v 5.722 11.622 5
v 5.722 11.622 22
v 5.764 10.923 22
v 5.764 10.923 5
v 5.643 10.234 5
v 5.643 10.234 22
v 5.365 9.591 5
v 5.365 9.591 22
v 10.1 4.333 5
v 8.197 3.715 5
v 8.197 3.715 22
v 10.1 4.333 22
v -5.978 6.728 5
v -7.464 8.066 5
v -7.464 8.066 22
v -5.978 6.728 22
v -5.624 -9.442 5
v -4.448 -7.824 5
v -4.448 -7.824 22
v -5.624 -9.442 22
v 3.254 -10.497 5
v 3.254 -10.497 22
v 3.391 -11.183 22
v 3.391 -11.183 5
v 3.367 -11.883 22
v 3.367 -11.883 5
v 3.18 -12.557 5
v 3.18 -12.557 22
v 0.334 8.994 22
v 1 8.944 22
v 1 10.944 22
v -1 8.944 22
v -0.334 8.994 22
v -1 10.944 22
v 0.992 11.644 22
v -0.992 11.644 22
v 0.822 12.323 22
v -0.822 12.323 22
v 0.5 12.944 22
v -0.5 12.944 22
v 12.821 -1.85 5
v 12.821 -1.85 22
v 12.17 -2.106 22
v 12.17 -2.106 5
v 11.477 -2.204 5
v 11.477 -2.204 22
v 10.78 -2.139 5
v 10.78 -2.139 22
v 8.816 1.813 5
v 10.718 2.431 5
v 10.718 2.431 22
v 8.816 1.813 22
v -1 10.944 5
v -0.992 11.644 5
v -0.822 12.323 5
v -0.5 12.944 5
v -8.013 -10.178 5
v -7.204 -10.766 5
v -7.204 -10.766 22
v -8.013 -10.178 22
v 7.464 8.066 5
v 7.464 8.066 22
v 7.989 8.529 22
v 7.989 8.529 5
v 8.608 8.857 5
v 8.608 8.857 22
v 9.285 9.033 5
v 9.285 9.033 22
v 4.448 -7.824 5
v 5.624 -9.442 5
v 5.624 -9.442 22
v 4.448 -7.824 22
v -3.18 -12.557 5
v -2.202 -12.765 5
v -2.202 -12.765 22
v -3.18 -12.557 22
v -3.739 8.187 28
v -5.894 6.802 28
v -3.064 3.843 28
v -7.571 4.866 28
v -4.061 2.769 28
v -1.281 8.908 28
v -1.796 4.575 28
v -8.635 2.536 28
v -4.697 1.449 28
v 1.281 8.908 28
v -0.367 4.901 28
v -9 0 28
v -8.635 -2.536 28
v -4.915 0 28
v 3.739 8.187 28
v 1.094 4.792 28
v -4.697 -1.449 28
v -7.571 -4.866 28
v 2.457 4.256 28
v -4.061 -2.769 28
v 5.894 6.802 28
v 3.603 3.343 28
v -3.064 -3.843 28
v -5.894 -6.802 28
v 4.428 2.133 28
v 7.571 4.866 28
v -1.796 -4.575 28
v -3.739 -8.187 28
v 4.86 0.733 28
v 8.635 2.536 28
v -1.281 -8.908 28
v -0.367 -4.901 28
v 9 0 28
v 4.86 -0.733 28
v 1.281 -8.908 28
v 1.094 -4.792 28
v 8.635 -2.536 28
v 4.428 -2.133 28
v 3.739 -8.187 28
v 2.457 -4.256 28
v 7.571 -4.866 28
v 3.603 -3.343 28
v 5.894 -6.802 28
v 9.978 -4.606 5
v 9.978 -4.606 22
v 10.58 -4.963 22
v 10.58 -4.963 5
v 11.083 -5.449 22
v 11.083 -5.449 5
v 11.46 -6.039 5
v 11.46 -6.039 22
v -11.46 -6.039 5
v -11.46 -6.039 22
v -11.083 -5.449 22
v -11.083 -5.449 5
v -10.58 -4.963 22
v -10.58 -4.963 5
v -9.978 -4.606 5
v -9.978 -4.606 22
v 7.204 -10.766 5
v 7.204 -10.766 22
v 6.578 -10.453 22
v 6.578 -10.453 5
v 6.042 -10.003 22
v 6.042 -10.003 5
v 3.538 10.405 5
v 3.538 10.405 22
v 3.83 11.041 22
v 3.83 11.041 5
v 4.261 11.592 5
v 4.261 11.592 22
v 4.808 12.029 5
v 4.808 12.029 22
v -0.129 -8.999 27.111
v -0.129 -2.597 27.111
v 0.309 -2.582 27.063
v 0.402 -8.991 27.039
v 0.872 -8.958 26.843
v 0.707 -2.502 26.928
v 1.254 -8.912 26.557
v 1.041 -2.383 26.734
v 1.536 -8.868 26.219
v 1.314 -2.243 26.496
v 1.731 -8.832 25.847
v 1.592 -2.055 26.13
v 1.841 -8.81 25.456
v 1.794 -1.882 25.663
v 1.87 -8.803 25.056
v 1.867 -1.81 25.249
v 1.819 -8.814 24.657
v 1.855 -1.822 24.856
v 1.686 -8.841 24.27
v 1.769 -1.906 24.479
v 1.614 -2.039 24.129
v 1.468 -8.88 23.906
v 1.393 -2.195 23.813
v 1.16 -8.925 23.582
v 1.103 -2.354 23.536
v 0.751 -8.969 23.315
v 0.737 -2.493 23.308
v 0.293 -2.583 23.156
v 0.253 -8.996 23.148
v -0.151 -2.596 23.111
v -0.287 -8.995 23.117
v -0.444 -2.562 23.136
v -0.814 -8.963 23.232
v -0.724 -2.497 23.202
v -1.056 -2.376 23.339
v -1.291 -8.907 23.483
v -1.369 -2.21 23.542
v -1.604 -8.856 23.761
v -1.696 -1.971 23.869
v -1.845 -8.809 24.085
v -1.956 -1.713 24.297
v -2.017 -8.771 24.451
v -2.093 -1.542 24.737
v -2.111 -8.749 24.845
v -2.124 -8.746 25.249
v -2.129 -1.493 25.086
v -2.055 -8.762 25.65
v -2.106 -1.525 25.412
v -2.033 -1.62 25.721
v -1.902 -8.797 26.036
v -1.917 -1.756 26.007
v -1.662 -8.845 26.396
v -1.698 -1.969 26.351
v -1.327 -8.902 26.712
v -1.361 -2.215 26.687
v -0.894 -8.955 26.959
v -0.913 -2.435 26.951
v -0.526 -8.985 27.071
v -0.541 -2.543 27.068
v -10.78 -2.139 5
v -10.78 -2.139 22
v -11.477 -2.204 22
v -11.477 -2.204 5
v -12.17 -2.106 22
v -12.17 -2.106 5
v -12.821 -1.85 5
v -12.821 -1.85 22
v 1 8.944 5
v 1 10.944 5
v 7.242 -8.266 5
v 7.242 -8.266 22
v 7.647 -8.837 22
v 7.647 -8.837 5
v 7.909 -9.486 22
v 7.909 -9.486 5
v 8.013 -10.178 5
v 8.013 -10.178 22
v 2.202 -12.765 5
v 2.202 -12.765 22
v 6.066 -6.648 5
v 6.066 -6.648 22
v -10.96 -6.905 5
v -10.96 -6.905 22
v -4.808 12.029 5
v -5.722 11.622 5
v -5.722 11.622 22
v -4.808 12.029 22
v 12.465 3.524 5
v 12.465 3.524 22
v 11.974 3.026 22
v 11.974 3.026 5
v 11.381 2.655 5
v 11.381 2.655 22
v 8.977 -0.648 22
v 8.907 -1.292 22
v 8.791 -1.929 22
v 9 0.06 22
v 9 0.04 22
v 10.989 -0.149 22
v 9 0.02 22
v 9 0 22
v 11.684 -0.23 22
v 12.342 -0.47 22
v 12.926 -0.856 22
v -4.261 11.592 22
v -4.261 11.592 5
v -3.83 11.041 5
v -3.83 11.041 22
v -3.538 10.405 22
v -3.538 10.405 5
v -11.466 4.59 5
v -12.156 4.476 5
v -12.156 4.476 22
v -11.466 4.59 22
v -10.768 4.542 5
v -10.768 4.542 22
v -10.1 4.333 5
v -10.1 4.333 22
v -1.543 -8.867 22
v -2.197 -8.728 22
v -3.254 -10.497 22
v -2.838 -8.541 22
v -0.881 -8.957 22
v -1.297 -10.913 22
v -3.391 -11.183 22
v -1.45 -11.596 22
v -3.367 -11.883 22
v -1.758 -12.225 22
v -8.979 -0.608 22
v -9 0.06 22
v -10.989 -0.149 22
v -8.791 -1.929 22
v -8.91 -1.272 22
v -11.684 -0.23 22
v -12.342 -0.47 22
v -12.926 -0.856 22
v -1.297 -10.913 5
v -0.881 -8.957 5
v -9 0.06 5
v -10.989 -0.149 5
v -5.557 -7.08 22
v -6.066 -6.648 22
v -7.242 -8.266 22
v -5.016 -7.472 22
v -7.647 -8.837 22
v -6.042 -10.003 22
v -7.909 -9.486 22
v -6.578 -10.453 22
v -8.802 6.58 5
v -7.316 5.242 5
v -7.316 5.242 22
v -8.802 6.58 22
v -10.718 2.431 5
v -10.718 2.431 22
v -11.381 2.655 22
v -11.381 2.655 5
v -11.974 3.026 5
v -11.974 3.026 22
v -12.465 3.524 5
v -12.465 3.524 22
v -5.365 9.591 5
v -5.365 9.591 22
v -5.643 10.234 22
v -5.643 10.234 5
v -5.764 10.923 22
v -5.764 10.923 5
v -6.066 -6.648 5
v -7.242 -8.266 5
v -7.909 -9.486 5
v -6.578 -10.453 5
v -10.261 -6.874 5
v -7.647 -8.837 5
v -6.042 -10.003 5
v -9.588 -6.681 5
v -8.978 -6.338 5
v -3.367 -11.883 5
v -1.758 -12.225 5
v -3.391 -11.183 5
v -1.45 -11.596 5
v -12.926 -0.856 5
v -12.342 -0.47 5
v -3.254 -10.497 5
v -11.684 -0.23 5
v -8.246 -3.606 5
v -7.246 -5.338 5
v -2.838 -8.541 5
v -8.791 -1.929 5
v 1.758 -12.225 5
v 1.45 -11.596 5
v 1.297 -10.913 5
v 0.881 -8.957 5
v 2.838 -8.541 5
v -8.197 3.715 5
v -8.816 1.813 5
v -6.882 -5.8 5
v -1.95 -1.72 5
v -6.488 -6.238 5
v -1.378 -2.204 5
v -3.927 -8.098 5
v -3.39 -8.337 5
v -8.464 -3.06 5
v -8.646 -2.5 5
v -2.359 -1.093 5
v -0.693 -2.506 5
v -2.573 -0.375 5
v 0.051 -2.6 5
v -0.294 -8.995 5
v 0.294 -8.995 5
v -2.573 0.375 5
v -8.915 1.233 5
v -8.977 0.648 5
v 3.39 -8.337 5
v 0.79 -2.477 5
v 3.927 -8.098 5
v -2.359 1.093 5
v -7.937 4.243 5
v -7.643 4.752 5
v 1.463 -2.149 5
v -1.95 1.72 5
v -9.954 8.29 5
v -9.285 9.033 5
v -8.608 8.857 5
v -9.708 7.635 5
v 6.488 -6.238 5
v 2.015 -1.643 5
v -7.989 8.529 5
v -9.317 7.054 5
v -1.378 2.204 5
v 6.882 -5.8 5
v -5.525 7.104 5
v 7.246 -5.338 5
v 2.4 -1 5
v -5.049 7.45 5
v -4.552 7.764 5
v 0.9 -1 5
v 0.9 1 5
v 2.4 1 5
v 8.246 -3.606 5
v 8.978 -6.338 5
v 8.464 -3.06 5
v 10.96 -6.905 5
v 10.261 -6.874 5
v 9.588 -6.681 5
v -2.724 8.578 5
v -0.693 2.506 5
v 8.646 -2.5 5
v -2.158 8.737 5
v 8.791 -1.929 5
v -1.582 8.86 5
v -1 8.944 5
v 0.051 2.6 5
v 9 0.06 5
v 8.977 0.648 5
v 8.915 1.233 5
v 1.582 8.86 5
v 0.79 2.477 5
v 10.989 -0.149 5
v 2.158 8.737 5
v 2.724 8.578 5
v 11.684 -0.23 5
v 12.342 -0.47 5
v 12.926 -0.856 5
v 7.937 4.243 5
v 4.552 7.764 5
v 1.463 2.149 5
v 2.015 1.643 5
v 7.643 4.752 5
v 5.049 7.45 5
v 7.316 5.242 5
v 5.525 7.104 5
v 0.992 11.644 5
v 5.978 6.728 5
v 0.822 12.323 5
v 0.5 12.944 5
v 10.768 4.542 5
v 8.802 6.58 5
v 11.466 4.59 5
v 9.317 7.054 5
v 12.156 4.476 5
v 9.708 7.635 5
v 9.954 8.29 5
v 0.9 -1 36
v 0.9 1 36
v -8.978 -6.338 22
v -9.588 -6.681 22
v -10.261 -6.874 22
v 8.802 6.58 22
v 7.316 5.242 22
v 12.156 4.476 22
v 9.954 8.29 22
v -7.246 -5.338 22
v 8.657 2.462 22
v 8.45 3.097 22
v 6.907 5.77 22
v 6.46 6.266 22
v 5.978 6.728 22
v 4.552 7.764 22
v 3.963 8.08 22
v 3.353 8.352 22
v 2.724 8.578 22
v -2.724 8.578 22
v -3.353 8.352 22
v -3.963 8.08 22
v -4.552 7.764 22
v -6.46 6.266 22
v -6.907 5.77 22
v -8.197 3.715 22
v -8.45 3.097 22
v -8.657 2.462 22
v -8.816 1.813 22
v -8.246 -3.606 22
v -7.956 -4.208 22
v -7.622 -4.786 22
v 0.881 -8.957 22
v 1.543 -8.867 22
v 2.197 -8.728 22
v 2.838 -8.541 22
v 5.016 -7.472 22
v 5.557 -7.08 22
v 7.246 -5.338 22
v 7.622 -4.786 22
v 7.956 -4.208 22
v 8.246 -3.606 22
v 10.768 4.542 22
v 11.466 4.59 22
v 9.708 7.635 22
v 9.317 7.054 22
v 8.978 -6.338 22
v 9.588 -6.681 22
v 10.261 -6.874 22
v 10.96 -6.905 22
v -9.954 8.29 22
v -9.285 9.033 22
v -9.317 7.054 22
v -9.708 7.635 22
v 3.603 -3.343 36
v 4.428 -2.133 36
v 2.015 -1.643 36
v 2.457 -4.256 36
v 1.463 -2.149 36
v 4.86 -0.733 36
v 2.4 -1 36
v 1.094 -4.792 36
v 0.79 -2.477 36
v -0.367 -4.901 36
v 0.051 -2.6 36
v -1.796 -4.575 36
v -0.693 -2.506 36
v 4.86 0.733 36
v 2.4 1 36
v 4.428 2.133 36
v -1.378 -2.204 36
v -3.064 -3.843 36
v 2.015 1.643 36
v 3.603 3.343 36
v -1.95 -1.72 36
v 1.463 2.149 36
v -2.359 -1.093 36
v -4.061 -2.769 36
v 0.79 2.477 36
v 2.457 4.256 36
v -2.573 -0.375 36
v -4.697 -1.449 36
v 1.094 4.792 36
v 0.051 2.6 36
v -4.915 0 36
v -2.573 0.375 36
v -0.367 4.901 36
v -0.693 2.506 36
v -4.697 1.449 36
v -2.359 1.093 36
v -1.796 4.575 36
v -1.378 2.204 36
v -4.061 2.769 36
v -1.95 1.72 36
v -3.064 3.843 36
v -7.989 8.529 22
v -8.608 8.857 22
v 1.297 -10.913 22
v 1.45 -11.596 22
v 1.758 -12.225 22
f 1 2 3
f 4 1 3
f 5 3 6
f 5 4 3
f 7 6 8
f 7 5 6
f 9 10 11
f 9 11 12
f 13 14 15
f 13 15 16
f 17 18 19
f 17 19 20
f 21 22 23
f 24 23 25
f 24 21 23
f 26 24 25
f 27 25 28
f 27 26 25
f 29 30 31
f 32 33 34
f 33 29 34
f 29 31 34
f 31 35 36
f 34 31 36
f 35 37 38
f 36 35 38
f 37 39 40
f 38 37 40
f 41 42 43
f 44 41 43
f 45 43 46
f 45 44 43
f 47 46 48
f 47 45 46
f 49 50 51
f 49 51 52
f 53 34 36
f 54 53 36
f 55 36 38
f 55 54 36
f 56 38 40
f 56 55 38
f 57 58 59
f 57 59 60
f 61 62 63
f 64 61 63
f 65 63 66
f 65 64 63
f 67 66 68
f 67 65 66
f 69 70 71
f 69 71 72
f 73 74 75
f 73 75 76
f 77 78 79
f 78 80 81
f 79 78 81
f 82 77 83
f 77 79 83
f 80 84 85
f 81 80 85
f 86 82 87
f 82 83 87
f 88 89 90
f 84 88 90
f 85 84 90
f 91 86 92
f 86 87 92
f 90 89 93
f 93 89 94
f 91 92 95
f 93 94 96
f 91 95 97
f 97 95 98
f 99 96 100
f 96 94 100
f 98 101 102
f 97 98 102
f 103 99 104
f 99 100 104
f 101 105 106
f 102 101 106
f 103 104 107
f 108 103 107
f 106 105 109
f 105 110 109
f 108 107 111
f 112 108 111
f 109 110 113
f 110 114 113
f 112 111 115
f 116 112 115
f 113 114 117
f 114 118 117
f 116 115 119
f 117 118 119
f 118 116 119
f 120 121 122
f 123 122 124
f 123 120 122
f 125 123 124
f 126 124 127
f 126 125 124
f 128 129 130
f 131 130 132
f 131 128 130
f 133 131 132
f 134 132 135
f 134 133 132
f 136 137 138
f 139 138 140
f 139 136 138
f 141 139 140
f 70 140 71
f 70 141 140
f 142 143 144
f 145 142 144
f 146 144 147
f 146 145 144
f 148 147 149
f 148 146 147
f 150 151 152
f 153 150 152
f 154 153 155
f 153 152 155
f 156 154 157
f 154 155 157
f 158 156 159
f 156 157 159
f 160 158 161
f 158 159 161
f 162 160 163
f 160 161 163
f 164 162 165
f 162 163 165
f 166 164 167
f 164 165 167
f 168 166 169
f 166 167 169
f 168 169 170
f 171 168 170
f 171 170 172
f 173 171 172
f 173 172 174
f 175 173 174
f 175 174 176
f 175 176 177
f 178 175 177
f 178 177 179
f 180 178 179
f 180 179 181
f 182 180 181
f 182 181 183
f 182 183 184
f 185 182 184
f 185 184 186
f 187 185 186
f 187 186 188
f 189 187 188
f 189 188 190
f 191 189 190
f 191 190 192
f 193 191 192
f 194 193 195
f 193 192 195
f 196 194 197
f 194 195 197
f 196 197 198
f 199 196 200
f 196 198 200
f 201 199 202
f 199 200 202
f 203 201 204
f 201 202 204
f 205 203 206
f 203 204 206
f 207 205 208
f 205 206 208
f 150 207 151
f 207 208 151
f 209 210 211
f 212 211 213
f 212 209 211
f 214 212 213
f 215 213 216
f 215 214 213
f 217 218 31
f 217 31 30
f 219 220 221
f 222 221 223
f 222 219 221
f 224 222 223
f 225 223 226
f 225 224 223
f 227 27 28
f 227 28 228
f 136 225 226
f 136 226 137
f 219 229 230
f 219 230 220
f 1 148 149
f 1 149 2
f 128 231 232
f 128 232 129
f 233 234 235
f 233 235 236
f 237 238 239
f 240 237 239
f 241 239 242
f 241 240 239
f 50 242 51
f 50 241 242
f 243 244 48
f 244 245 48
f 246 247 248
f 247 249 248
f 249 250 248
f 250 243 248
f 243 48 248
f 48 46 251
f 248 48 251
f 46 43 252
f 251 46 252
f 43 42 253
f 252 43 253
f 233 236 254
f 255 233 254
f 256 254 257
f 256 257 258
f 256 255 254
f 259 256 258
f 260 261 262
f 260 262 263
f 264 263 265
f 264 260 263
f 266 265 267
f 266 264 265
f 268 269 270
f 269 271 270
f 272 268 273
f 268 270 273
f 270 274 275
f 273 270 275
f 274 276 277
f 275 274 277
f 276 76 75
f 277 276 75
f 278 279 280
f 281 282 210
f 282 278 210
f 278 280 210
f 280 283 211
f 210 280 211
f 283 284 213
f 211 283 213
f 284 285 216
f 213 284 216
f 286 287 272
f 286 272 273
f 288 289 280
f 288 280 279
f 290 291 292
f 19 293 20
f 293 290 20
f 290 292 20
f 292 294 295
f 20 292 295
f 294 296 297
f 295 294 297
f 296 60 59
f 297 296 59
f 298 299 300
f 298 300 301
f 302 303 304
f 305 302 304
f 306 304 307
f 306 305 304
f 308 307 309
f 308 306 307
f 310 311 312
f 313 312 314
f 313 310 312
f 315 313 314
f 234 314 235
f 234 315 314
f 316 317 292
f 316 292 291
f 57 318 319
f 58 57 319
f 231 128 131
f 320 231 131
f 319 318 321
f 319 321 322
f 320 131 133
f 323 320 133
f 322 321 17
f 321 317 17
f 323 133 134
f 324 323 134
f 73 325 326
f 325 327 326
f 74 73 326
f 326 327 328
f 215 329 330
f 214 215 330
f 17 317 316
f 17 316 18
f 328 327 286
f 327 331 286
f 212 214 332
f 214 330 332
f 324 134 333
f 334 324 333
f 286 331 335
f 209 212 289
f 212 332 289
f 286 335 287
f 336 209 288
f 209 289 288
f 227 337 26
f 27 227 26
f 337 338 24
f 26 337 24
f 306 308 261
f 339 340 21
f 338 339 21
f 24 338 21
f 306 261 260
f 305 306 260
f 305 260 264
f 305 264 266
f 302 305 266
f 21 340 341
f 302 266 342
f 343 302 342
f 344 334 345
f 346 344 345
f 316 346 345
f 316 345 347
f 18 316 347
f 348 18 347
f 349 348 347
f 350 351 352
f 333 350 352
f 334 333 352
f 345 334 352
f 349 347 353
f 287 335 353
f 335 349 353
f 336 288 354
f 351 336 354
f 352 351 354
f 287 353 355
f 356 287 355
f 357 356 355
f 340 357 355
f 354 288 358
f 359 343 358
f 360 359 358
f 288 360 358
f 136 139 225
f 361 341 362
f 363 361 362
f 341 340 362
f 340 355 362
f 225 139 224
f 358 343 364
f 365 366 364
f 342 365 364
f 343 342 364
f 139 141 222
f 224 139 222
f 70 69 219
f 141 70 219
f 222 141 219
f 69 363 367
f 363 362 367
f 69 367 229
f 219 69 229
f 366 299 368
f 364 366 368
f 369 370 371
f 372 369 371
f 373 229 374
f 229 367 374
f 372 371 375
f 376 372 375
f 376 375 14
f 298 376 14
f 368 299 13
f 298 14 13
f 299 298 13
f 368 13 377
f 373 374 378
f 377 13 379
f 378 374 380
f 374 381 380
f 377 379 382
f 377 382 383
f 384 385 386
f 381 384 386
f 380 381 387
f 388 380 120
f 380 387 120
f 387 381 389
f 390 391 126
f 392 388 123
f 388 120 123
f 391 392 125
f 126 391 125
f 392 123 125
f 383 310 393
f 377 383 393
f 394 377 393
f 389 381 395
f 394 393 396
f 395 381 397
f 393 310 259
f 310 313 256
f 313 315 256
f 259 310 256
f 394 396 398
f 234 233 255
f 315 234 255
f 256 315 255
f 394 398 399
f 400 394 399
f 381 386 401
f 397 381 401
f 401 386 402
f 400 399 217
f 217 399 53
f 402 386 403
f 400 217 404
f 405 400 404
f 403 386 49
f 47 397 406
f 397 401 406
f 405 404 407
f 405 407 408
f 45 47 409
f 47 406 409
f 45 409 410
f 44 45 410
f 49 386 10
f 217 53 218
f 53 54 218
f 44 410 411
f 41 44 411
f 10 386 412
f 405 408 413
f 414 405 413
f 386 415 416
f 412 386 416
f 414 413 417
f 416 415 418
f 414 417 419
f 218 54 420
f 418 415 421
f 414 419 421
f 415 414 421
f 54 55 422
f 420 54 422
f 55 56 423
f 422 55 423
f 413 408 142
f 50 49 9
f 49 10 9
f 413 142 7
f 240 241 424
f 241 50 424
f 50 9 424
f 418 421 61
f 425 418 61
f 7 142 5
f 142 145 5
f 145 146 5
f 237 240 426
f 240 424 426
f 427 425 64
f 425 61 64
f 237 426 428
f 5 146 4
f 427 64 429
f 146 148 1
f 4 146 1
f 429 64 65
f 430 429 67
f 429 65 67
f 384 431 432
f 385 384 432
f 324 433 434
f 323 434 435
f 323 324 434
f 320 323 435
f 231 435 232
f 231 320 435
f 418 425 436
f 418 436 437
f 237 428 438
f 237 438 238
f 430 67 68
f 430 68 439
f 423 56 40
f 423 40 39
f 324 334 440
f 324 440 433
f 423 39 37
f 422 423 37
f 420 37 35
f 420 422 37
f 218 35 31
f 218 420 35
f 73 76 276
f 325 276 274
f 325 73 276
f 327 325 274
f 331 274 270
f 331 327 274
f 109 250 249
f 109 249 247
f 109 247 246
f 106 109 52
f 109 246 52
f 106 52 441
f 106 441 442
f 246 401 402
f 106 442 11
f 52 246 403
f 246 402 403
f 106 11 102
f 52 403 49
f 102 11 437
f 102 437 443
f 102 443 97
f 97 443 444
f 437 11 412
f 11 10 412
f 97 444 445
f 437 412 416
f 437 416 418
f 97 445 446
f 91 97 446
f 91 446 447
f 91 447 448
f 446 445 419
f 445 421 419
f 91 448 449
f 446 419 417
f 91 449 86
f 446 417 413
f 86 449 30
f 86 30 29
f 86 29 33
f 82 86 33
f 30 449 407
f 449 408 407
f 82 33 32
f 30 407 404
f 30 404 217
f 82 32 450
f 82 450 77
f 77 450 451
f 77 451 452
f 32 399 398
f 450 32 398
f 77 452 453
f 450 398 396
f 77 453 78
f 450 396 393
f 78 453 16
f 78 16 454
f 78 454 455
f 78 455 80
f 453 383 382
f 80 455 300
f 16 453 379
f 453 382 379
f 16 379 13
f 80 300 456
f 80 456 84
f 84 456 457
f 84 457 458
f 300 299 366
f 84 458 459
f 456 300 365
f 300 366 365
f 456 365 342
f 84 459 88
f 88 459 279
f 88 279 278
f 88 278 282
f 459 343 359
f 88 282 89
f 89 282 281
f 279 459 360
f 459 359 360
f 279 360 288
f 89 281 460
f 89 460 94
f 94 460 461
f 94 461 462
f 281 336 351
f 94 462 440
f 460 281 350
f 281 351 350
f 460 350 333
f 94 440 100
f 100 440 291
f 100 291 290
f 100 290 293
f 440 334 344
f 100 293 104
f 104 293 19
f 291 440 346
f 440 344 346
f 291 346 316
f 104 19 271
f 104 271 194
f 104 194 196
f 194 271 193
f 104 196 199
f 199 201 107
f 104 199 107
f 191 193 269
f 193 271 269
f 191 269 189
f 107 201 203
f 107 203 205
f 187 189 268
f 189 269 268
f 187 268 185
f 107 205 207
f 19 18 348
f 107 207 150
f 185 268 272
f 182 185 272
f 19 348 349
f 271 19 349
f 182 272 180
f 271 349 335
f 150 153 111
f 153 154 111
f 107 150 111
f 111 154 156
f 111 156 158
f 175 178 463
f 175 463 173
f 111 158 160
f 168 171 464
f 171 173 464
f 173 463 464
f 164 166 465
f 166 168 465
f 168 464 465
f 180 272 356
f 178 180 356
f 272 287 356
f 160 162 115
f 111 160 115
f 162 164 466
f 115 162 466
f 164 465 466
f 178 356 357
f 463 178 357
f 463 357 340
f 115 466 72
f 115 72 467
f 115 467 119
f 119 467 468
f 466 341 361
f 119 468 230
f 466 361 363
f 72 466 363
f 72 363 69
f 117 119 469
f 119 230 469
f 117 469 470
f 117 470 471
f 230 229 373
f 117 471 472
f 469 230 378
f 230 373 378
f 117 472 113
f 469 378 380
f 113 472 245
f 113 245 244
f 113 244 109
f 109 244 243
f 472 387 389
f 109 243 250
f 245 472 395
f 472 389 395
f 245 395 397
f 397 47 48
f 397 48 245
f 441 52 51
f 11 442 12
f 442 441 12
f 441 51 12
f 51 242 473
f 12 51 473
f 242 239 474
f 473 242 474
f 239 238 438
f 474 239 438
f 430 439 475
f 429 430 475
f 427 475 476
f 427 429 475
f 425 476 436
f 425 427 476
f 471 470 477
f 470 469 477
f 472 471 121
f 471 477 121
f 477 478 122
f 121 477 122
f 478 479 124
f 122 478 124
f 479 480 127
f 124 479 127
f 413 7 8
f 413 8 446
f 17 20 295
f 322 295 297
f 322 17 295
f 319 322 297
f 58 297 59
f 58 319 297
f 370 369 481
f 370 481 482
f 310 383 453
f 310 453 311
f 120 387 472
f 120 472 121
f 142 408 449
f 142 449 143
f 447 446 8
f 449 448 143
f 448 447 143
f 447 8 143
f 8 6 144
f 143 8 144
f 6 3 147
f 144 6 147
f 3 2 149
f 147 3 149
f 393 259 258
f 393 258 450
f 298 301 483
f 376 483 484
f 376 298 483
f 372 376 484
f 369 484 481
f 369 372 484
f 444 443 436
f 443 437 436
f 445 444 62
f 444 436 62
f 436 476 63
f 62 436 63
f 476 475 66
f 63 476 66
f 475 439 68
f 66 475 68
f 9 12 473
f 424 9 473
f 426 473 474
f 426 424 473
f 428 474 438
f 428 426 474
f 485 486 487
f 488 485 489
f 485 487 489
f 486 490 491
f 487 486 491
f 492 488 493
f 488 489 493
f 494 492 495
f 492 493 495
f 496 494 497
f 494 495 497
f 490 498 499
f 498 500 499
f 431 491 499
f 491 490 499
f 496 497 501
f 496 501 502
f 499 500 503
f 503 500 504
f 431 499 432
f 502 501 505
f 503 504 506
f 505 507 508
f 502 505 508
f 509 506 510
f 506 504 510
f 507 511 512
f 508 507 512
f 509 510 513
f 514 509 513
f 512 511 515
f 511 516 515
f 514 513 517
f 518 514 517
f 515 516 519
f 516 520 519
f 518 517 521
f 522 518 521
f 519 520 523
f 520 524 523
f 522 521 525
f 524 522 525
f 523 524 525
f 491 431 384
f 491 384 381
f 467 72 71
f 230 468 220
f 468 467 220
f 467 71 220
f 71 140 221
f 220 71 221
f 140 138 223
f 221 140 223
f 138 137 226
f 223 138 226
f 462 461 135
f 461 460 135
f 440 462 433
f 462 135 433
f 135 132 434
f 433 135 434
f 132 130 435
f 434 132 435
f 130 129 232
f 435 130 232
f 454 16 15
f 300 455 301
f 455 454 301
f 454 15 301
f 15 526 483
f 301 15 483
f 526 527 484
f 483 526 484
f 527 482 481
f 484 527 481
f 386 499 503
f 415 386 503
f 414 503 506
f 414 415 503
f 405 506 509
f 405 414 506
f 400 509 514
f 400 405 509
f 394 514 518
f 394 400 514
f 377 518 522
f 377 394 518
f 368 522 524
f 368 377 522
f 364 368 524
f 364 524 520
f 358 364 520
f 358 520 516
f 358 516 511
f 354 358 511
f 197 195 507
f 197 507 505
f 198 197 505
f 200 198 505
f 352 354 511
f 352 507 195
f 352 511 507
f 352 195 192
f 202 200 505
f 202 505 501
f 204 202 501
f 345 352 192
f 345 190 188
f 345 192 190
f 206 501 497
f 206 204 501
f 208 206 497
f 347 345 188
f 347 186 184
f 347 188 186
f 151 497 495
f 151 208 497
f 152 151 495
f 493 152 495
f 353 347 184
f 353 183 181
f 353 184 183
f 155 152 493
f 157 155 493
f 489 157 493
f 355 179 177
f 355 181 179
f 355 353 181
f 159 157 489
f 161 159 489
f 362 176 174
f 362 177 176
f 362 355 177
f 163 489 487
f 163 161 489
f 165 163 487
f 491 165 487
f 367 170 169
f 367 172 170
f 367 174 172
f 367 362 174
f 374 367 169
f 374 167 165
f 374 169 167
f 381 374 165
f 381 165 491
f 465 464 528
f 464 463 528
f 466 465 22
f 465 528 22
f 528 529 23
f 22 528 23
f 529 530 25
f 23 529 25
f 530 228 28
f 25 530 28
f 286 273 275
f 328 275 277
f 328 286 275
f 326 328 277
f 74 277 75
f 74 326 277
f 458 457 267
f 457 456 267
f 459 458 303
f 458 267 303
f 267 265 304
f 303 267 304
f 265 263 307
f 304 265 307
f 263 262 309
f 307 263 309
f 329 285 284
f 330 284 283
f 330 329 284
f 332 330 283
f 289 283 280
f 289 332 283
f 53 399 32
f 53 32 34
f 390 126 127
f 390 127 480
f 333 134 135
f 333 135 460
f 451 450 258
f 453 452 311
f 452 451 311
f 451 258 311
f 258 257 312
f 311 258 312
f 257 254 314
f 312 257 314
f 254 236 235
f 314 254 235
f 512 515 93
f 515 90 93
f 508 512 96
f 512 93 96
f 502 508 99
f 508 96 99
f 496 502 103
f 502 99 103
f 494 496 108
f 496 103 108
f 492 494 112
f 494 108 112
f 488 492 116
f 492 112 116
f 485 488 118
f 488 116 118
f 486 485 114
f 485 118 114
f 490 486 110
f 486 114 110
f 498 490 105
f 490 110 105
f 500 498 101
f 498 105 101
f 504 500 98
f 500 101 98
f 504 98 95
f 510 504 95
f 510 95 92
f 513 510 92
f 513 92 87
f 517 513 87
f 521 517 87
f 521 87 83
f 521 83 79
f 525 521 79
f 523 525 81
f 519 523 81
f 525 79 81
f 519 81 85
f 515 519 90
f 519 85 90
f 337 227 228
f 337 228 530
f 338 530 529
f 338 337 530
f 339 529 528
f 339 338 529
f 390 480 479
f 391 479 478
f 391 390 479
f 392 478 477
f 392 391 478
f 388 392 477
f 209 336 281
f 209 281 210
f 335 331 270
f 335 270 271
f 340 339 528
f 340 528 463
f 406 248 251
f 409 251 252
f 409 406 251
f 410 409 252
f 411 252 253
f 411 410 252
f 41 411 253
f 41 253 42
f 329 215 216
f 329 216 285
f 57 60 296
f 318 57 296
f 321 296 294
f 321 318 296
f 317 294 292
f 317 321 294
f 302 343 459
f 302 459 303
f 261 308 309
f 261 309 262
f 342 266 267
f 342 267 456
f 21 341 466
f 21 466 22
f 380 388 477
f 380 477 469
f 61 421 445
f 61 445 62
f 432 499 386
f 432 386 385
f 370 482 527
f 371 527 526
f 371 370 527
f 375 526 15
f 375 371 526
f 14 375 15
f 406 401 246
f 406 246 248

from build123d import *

# Parameters (mm, degrees)
SKETCH1_R                    = 9
SKETCH1_R_2                  = 2.6
BOSS_EXTRUDE1_DEPTH          = 36
SKETCH5_W                    = 5
SKETCH5_H                    = 4.08502449
SKETCH5_W_2                  = 8
BOSS_EXTRUDE2_DEPTH          = 22
SKETCH7_W                    = 5
SKETCH7_H                    = 4.653899232
CUT_REVOLVE2_ANGLE           = 90
CUT_REVOLVE2_OTHER_WAY_ANGLE = 90
CIRPATTERN1_COUNT            = 15
SKETCH13_W                   = 5
SKETCH13_H                   = 16.616445935
SKETCH17_R                   = 2
CUT_EXTRUDE1_DEPTH           = 10
BOSS_EXTRUDE3_DEPTH          = 31


with BuildPart() as part:
    # Sketch1 → Boss-Extrude1 (new body)
    with BuildSketch(Plane.XY):
        Circle(SKETCH1_R)
        Circle(SKETCH1_R_2, mode=Mode.SUBTRACT)
    extrude(amount=BOSS_EXTRUDE1_DEPTH)

    # Sketch5 → Cut-Revolve1 (revolve, cut)
    with BuildSketch(Plane(origin=(0, 0, 0), x_dir=(0, 0, -1), z_dir=(1, 0, 0)), mode=Mode.PRIVATE) as cut_revolve1_sk:
        with Locations((-2.5, 6.957487755)):
            Rectangle(SKETCH5_W, SKETCH5_H)
        with Locations((-32, 6.957487755)):
            Rectangle(SKETCH5_W_2, SKETCH5_H)
    revolve(cut_revolve1_sk.sketch.rotate(Axis((0, 0, 0), (0, 0, 1)), 90), axis=Axis((0, 0, 0), (0, 0, 1)), mode=Mode.SUBTRACT)

    # Sketch6 → Boss-Extrude2 (add)
    with BuildSketch(Plane.XY):
        with BuildLine():
            Line((-1, 8.94427191), (-1, 10.94427191))
            ThreePointArc((-1, 10.94427191), (-0.927189817, 11.988569364), (-0.5, 12.94427191))
            Line((-0.5, 12.94427191), (0.5, 12.94427191))
            ThreePointArc((0.5, 12.94427191), (0.927189817, 11.988569364), (1, 10.94427191))
            Line((1, 10.94427191), (1, 8.94427191))
            Line((1, 8.94427191), (-1, 8.94427191))
        make_face()
    boss_extrude2 = extrude(amount=BOSS_EXTRUDE2_DEPTH)

    # Sketch7 → Cut-Revolve2 (revolve, cut)
    with BuildSketch(Plane(origin=(0, 0, 0), x_dir=(0, 0, -1), z_dir=(1, 0, 0))):
        with Locations((-2.5, 11.271221526)):
            Rectangle(SKETCH7_W, SKETCH7_H)
    revolve(axis=Axis((0, 8.94427191, 5), (0, 0, -1)), revolution_arc=CUT_REVOLVE2_ANGLE, mode=Mode.SUBTRACT)

    # Sketch7 → Cut-Revolve2 other way (revolve, cut)
    with BuildSketch(Plane(origin=(0, 0, 0), x_dir=(0, 0, -1), z_dir=(1, 0, 0))):
        with Locations((-2.5, 11.271221526)):
            Rectangle(SKETCH7_W, SKETCH7_H)
    revolve(axis=Axis((0, 8.94427191, 5), (0, 0, 1)), revolution_arc=CUT_REVOLVE2_OTHER_WAY_ANGLE, mode=Mode.SUBTRACT)

    # CirPattern1: Boss-Extrude2 ×15 about axis
    cirpattern1_axis = Axis((0, 0, 0), (0, 0, 1))
    for i in range(1, CIRPATTERN1_COUNT):
        add(boss_extrude2.rotate(cirpattern1_axis, i * 360 / CIRPATTERN1_COUNT))

    # Sketch13 → Cut-Revolve6 (revolve, cut)
    with BuildSketch(Plane(origin=(0, 0, 0), x_dir=(0, 0, -1), z_dir=(1, 0, 0)), mode=Mode.PRIVATE) as cut_revolve6_sk:
        with Locations((-2.5, 8.308222968)):
            Rectangle(SKETCH13_W, SKETCH13_H)
    revolve(cut_revolve6_sk.sketch.rotate(Axis((0, 0, 25.578402878), (0, 0, -1)), 270), axis=Axis((0, 0, 25.578402878), (0, 0, -1)), mode=Mode.SUBTRACT)

    # Sketch17 → Cut-Extrude1 (cut)
    with BuildSketch(Plane(origin=(0, 0, 0), x_dir=(1, 0, 0), z_dir=(0, 1, 0))):
        with Locations(Location((-0.128741976, -25.11123185, 0), (0, 0, 270))):
            Circle(SKETCH17_R)
    extrude(amount=-CUT_EXTRUDE1_DEPTH, mode=Mode.SUBTRACT)

    # Sketch19 → Boss-Extrude3 (add)
    with BuildSketch(Plane.XY.offset(36)):
        Polygon((2.4, 1), (3.9, 1), (3.9, -1), (2.4, -1), (0.9, -1), (0.9, 1), align=None)
    extrude(amount=-BOSS_EXTRUDE3_DEPTH)


solid = part.part
